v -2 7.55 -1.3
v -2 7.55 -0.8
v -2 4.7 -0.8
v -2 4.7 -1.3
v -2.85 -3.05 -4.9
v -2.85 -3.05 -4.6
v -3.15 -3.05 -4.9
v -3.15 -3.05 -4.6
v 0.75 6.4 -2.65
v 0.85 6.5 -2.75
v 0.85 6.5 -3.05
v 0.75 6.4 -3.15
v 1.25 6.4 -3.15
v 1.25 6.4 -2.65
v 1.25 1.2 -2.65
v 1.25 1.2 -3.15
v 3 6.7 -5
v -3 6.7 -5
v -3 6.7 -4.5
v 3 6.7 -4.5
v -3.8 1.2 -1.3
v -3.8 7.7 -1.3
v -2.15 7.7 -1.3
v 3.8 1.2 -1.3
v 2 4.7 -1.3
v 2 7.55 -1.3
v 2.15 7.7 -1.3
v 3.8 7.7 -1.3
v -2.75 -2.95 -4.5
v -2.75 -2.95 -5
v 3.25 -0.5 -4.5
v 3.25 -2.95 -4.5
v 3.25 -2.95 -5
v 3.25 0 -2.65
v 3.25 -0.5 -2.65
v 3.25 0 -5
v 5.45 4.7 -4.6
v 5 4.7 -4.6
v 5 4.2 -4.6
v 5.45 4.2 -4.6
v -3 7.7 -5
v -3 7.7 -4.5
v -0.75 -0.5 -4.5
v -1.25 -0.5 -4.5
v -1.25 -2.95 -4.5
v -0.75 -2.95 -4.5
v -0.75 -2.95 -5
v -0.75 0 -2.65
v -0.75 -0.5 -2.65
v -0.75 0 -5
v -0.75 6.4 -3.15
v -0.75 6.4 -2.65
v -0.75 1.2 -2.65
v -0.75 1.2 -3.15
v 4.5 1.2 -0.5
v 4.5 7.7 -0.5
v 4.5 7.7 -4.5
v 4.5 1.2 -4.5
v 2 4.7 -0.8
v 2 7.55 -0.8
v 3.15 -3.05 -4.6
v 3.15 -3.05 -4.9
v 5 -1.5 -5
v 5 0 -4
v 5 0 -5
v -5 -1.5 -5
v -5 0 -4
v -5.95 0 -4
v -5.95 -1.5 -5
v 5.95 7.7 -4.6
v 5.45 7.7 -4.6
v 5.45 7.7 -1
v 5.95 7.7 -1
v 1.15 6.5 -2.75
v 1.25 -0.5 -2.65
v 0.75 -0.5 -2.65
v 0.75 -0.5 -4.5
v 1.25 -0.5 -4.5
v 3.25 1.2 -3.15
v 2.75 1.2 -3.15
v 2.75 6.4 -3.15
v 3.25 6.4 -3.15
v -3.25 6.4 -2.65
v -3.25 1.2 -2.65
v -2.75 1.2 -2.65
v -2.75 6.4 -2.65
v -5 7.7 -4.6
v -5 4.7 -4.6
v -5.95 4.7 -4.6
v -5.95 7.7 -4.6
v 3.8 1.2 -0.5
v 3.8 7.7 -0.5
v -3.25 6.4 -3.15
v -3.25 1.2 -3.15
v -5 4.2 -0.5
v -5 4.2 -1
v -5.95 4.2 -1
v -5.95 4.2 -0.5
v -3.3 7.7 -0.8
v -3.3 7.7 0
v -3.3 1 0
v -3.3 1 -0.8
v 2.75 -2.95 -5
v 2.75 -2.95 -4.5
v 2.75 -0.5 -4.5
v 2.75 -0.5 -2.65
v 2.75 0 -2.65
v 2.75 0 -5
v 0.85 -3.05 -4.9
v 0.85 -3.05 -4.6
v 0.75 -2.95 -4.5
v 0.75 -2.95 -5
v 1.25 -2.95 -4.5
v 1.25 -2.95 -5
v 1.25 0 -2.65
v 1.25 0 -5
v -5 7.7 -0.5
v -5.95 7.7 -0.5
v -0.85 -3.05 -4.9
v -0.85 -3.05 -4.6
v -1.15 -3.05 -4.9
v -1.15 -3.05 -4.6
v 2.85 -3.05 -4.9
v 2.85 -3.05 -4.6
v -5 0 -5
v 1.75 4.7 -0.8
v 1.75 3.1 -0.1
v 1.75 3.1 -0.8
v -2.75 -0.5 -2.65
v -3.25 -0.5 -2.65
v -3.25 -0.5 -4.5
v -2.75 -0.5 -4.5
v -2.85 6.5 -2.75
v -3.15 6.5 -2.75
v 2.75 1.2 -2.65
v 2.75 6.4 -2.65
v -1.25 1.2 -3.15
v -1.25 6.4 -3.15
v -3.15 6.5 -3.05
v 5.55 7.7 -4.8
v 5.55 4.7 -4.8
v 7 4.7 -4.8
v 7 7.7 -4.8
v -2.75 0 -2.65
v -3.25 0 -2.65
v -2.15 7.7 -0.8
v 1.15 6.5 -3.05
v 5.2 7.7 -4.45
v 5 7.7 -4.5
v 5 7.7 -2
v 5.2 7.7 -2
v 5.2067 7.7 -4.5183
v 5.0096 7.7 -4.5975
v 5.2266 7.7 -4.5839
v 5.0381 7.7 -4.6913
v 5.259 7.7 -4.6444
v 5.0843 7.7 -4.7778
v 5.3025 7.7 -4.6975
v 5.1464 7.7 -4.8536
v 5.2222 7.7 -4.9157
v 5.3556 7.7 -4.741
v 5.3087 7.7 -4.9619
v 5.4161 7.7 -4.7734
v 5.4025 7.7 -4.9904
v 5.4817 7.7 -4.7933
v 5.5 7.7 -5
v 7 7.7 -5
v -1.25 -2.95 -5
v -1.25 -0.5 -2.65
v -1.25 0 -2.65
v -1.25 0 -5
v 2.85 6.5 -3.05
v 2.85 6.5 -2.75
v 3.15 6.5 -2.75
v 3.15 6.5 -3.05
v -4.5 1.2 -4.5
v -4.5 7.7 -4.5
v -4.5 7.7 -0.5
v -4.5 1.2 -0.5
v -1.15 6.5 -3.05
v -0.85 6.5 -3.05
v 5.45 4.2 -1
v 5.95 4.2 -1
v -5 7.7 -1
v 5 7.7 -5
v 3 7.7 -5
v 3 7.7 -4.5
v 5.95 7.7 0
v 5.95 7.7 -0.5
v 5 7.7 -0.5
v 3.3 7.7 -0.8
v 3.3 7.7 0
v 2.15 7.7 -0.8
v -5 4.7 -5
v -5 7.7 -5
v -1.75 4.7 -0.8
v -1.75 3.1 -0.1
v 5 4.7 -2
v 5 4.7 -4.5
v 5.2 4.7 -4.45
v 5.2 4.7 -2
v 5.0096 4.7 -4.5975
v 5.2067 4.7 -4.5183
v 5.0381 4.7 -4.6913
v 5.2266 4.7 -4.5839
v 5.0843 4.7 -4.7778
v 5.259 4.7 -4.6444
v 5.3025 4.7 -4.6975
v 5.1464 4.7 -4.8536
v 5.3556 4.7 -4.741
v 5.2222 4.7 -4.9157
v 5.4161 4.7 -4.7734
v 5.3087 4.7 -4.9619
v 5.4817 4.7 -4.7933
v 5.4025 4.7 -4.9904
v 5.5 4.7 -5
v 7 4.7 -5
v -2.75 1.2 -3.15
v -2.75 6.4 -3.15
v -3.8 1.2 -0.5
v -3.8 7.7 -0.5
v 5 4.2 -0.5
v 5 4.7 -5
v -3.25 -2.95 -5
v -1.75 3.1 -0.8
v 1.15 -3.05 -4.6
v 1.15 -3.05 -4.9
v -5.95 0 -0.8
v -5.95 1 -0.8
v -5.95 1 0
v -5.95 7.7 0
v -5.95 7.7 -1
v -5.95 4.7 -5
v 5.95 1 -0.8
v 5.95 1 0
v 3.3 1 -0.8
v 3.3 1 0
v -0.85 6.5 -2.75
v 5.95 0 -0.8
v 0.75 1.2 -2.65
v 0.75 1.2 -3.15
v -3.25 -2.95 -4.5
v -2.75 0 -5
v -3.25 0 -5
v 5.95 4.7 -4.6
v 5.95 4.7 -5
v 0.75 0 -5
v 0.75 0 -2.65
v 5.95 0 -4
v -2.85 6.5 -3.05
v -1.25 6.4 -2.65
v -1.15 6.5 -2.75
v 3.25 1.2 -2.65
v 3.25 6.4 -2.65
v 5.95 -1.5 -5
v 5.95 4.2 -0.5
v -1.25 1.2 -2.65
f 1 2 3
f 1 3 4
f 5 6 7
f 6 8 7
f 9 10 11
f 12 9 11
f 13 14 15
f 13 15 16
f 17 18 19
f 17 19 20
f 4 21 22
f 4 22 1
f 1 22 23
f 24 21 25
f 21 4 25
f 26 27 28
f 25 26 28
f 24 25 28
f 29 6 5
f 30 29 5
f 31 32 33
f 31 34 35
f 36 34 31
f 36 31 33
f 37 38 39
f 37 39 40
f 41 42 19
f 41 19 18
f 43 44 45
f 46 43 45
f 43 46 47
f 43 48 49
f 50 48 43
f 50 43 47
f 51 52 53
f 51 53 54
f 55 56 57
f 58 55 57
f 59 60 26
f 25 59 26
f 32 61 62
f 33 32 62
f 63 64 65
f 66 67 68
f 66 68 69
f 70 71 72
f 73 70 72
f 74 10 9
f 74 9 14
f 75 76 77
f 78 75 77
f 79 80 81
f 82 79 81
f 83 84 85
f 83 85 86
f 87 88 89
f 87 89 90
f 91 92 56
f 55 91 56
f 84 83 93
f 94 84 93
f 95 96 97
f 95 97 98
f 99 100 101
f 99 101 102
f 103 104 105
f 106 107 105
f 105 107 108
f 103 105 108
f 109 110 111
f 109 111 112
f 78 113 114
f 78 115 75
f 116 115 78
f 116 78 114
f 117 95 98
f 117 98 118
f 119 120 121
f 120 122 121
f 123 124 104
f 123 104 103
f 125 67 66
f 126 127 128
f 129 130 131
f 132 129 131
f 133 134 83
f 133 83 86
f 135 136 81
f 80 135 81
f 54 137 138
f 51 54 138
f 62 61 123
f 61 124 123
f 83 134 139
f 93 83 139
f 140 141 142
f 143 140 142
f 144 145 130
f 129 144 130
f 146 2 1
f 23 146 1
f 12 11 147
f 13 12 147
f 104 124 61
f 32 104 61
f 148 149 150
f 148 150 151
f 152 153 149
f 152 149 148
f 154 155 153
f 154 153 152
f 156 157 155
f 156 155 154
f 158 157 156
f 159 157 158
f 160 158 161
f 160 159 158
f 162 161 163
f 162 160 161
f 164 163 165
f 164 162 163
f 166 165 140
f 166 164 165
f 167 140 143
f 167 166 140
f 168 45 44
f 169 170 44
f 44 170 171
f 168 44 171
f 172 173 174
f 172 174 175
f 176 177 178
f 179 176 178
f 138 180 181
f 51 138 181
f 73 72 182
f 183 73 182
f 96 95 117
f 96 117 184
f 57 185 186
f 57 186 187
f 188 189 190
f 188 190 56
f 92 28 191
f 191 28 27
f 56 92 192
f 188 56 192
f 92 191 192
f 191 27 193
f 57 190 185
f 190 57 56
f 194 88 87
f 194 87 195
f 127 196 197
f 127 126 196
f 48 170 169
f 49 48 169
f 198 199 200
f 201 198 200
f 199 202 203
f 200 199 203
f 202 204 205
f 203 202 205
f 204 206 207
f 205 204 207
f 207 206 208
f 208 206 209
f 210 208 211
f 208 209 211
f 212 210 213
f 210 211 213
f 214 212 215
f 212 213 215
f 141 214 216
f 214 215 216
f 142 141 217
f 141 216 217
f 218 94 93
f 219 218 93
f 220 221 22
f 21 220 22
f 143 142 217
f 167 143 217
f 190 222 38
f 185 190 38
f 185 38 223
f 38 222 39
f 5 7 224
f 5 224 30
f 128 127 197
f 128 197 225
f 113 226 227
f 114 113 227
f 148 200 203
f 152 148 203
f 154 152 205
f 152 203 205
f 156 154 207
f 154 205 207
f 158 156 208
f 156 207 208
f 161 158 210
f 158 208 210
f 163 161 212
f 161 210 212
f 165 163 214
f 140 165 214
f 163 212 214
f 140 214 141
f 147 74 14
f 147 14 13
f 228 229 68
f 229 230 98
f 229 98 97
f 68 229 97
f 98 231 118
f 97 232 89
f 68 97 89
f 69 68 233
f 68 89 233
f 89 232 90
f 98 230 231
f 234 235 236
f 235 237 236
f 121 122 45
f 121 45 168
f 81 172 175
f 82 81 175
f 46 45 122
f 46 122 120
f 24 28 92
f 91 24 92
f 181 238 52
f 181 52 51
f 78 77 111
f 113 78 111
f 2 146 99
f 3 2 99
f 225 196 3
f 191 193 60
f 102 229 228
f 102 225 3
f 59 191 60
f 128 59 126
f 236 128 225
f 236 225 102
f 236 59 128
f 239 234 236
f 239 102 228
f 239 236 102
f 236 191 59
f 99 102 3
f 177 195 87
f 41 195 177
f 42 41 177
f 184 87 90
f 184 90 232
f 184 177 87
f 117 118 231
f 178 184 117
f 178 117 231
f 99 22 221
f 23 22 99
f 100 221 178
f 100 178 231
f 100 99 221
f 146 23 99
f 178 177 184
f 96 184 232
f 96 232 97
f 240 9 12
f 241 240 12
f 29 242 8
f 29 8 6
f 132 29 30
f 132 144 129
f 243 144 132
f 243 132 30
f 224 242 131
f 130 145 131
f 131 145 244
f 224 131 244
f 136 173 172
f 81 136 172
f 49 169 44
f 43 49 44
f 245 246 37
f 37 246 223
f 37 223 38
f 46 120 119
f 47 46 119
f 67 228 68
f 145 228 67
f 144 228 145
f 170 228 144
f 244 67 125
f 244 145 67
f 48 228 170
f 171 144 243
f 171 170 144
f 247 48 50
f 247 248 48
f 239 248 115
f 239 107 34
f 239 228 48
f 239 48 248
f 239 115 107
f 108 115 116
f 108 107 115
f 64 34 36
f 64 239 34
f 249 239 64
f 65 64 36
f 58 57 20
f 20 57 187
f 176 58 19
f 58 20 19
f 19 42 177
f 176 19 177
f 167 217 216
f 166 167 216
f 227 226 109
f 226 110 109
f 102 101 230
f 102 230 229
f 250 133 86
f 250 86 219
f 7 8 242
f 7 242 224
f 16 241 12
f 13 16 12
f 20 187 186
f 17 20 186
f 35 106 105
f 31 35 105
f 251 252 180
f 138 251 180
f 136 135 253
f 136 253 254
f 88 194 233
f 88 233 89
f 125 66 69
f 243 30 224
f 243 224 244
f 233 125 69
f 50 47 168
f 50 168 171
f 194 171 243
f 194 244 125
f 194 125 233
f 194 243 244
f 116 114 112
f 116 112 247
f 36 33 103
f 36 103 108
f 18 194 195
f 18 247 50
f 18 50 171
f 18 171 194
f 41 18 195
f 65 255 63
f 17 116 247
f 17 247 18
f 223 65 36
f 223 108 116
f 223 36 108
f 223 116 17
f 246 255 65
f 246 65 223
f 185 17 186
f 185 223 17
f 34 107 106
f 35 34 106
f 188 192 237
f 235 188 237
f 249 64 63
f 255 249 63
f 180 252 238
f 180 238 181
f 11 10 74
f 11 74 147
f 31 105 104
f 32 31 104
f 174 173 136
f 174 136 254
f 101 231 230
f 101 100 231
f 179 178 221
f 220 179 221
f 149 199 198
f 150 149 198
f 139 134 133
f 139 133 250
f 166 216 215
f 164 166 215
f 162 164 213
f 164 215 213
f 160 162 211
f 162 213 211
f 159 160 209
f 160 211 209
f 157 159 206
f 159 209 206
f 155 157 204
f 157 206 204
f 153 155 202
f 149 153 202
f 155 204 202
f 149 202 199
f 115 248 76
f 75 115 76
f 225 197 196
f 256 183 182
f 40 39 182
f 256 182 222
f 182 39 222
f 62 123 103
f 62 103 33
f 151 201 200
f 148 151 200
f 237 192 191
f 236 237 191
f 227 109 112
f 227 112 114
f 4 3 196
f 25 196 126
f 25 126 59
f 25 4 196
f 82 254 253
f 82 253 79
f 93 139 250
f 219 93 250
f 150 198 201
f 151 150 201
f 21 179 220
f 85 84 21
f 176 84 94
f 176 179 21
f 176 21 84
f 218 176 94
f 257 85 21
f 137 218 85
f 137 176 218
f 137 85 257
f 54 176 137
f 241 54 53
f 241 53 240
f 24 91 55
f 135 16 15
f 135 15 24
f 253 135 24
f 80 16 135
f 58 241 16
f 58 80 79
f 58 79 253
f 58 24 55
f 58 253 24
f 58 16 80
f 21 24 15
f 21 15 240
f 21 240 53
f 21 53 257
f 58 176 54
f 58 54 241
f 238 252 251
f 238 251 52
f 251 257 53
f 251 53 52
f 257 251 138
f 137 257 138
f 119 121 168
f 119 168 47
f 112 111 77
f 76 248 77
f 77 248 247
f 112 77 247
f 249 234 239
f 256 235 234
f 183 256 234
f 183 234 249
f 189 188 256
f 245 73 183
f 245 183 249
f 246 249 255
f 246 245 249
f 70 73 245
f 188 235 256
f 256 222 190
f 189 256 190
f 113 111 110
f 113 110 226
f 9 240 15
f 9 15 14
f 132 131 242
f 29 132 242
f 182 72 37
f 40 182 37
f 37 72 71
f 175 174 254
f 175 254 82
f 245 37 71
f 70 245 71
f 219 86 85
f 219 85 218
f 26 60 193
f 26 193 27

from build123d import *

# Parameters (mm, degrees)
ESQUISSE1_W                             = 10
ESQUISSE1_H                             = 5
BOSS_EXTRU_1_DEPTH                      = 7.7
ESQUISSE7_W                             = 0.8
ESQUISSE7_H                             = 1
ENL_V_MAT_EXTRU_5_DEPTH                 = 14.575345299
ESQUISSE2_W                             = 6.6
ESQUISSE2_H                             = 1.6
ENL_V_MAT_EXTRU_1_DEPTH                 = 11.454185765
ENL_V_MAT_EXTRU_2_DEPTH                 = 6.5
ESQUISSE5_W                             = 6
ESQUISSE5_H                             = 1
ENL_V_MAT_EXTRU_3_DEPTH                 = 1
ESQUISSE6_W                             = 4
ESQUISSE6_H                             = 1
ENL_V_MAT_EXTRU_4_DEPTH                 = 3
BOSS_EXTRU_2_DEPTH                      = 1.75
CHANFREIN1_SIZE                         = 0.15
EXTRU_MINCE4_START                      = -0.25
EXTRU_MINCE4_OUTLINE_W                  = 0.5
EXTRU_MINCE4_OUTLINE_H                  = 5.3
EXTRU_MINCE4_DEPTH                      = 0.5
CHANFREIN6_SIZE                         = 0.1
R_P_TITION_LIN_AIRE8_COUNT              = 4
R_P_TITION_LIN_AIRE8_PITCH              = 2
CHANFREIN6_OF_R_P_TITION_LIN_AIRE8_SIZE = 0.1
BOSS_EXTRU_3_DEPTH                      = 0.95
ESQUISSE19_W                            = 0.45
ESQUISSE19_H                            = 3.6
ENL_V_MAT_EXTRU_6_DEPTH                 = 3.5
BOSS_EXTRU_4_DEPTH                      = 3


# Read off the part's stored shape, not the designer's step: Extru.-Mince4
with BuildPart() as part:
    # Esquisse1 → Boss.-Extru.1 (new body)
    with BuildSketch(Plane(origin=(0, 0, 0), x_dir=(1, 0, 0), z_dir=(0, 1, 0))):
        with Locations((0, 2.5)):
            Rectangle(ESQUISSE1_W, ESQUISSE1_H)
    extrude(amount=BOSS_EXTRU_1_DEPTH)

    # Esquisse7 → Enlèv. mat.-Extru.5 (cut, through all)
    with BuildSketch(Plane(origin=(5, 0, 0), x_dir=(0, 0, -1), z_dir=(1, 0, 0))):
        with Locations((0.4, 0.5)):
            Rectangle(ESQUISSE7_W, ESQUISSE7_H)
    extrude(amount=-ENL_V_MAT_EXTRU_5_DEPTH, mode=Mode.SUBTRACT)

    # Esquisse2 → Enlèv. mat.-Extru.1 (cut, through all)
    with BuildSketch(Plane(origin=(0, 7.7, 0), x_dir=(1, 0, 0), z_dir=(0, 1, 0))):
        Rectangle(ESQUISSE2_W, ESQUISSE2_H)
    extrude(amount=-ENL_V_MAT_EXTRU_1_DEPTH, mode=Mode.SUBTRACT)

    # Esquisse4 → Enlèv. mat.-Extru.2 (cut)
    with BuildSketch(Plane(origin=(0, 7.7, 0), x_dir=(1, 0, 0), z_dir=(0, 1, 0))):
        Polygon((-3.8, 1.3), (3.8, 1.3), (3.8, 0.5), (4.5, 0.5), (4.5, 4.5), (-4.5, 4.5), (-4.5, 0.5), (-3.8, 0.5), align=None)
    extrude(amount=-ENL_V_MAT_EXTRU_2_DEPTH, mode=Mode.SUBTRACT)

    # Esquisse5 → Enlèv. mat.-Extru.3 (cut)
    with BuildSketch(Plane(origin=(0, 7.7, 0), x_dir=(1, 0, 0), z_dir=(0, 1, 0))):
        with Locations((0, 4.5)):
            Rectangle(ESQUISSE5_W, ESQUISSE5_H)
    extrude(amount=-ENL_V_MAT_EXTRU_3_DEPTH, mode=Mode.SUBTRACT)

    # Esquisse6 → Enlèv. mat.-Extru.4 (cut)
    with BuildSketch(Plane(origin=(0, 7.7, 0), x_dir=(1, 0, 0), z_dir=(0, 1, 0))):
        with Locations((0, 0.8)):
            Rectangle(ESQUISSE6_W, ESQUISSE6_H)
    extrude(amount=-ENL_V_MAT_EXTRU_4_DEPTH, mode=Mode.SUBTRACT)

    # Esquisse11 → Boss.-Extru.2 (add, symmetric)
    with BuildSketch(Plane(origin=(0, 0, 0), x_dir=(0, 0, -1), z_dir=(1, 0, 0))):
        Polygon((0.8, 4.7), (0.1, 3.1), (0.8, 3.1), align=None)
    extrude(amount=BOSS_EXTRU_2_DEPTH, both=True)

    # Chanfrein1
    chanfrein1_edges = [part.edges().sort_by_distance(p)[0] for p in [
        (2, 7.7, -1.05),
        (-2, 7.7, -1.05),
    ]]
    chamfer(chanfrein1_edges, length=CHANFREIN1_SIZE)

    # Extru.-Mince4 outline → Extru.-Mince4 (add)
    with BuildSketch(Plane(origin=(3, 0, 0), x_dir=(0, 0, -1), z_dir=(1, 0, 0)).offset(EXTRU_MINCE4_START)):
        Polygon((2.65, -0.5), (4.5, -0.5), (4.5, -3.05), (5, -3.05), (5, 0), (2.65, 0), align=None)
        with Locations((2.9, 3.85)):
            Rectangle(EXTRU_MINCE4_OUTLINE_W, EXTRU_MINCE4_OUTLINE_H)
    extru_mince4 = extrude(amount=EXTRU_MINCE4_DEPTH)

    # Chanfrein6
    chanfrein6_edges = [part.edges().sort_by_distance(p)[0] for p in [
        (3, 6.5, -2.65),
        (2.75, 6.5, -2.9),
        (3.25, 6.5, -2.9),
        (3, 6.5, -3.15),
        (3.25, -3.05, -4.75),
        (3, -3.05, -4.5),
        (3, -3.05, -5),
        (2.75, -3.05, -4.75),
    ]]
    chamfer(chanfrein6_edges, length=CHANFREIN6_SIZE)

    # Répétition linéaire8: Extru.-Mince4 ×4
    with Locations(*[(-i * R_P_TITION_LIN_AIRE8_PITCH, 0, 0) for i in range(1, R_P_TITION_LIN_AIRE8_COUNT)]):
        add(extru_mince4)

    # Chanfrein6 of Répétition linéaire8
    chanfrein6_of_r_p_tition_lin_aire8_edges = [part.edges().sort_by_distance(p)[0] for p in [
        (1, 6.5, -2.65),
        (0.75, 6.5, -2.9),
        (1.25, 6.5, -2.9),
        (1, 6.5, -3.15),
        (1.25, -3.05, -4.75),
        (1, -3.05, -4.5),
        (1, -3.05, -5),
        (0.75, -3.05, -4.75),
        (-1, 6.5, -2.65),
        (-1.25, 6.5, -2.9),
        (-0.75, 6.5, -2.9),
        (-1, 6.5, -3.15),
        (-0.75, -3.05, -4.75),
        (-1, -3.05, -4.5),
        (-1, -3.05, -5),
        (-1.25, -3.05, -4.75),
        (-3, 6.5, -2.65),
        (-3.25, 6.5, -2.9),
        (-2.75, 6.5, -2.9),
        (-3, 6.5, -3.15),
        (-2.75, -3.05, -4.75),
        (-3, -3.05, -4.5),
        (-3, -3.05, -5),
        (-3.25, -3.05, -4.75),
    ]]
    chamfer(chanfrein6_of_r_p_tition_lin_aire8_edges, length=CHANFREIN6_OF_R_P_TITION_LIN_AIRE8_SIZE)

    # Esquisse18 → Boss.-Extru.3 (add)
    with BuildSketch(Plane(origin=(5, 0, 0), x_dir=(0, 0, -1), z_dir=(1, 0, 0))):
        Polygon((0, 7.7), (0, 1), (0.8, 1), (0.8, 0), (4, 0), (5, -1.5), (5, 0), (5, 4.7), (4.6, 4.7), (4.6, 7.7), (1, 7.7), (1, 4.2), (0.5, 4.2), (0.5, 7.7), align=None)
    boss_extru_3 = extrude(amount=BOSS_EXTRU_3_DEPTH)

    # Symétrie1: Boss.-Extru.3 across plane
    add(boss_extru_3.mirror(Plane(origin=(0, 0, 0), x_dir=(0, 0, 1), z_dir=(1, 0, 0))))

    # Esquisse19 → Enlèv. mat.-Extru.6 (cut)
    with BuildSketch(Plane(origin=(0, 7.7, 0), x_dir=(1, 0, 0), z_dir=(0, 1, 0))):
        with Locations((5.225, 2.8)):
            Rectangle(ESQUISSE19_W, ESQUISSE19_H)
    extrude(amount=-ENL_V_MAT_EXTRU_6_DEPTH, mode=Mode.SUBTRACT)


with BuildPart() as body_2:
    # Esquisse20 → Boss.-Extru.4 (new body)
    with BuildSketch(Plane(origin=(0, 4.7, 0), x_dir=(1, 0, 0), z_dir=(0, 1, 0))):
        with BuildLine():
            Line((5, 4.5), (5, 2))
            Line((5, 2), (5.2, 2))
            Line((5.2, 2), (5.2, 4.45))
            ThreePointArc((5.2, 4.45), (5.302512627, 4.697487373), (5.55, 4.8))
            Line((5.55, 4.8), (7, 4.8))
            Line((7, 4.8), (7, 5))
            Line((7, 5), (5.5, 5))
            ThreePointArc((5.5, 5), (5.146446609, 4.853553391), (5, 4.5))
        make_face()
    extrude(amount=BOSS_EXTRU_4_DEPTH)


solid = Compound([part.part, body_2.part])
